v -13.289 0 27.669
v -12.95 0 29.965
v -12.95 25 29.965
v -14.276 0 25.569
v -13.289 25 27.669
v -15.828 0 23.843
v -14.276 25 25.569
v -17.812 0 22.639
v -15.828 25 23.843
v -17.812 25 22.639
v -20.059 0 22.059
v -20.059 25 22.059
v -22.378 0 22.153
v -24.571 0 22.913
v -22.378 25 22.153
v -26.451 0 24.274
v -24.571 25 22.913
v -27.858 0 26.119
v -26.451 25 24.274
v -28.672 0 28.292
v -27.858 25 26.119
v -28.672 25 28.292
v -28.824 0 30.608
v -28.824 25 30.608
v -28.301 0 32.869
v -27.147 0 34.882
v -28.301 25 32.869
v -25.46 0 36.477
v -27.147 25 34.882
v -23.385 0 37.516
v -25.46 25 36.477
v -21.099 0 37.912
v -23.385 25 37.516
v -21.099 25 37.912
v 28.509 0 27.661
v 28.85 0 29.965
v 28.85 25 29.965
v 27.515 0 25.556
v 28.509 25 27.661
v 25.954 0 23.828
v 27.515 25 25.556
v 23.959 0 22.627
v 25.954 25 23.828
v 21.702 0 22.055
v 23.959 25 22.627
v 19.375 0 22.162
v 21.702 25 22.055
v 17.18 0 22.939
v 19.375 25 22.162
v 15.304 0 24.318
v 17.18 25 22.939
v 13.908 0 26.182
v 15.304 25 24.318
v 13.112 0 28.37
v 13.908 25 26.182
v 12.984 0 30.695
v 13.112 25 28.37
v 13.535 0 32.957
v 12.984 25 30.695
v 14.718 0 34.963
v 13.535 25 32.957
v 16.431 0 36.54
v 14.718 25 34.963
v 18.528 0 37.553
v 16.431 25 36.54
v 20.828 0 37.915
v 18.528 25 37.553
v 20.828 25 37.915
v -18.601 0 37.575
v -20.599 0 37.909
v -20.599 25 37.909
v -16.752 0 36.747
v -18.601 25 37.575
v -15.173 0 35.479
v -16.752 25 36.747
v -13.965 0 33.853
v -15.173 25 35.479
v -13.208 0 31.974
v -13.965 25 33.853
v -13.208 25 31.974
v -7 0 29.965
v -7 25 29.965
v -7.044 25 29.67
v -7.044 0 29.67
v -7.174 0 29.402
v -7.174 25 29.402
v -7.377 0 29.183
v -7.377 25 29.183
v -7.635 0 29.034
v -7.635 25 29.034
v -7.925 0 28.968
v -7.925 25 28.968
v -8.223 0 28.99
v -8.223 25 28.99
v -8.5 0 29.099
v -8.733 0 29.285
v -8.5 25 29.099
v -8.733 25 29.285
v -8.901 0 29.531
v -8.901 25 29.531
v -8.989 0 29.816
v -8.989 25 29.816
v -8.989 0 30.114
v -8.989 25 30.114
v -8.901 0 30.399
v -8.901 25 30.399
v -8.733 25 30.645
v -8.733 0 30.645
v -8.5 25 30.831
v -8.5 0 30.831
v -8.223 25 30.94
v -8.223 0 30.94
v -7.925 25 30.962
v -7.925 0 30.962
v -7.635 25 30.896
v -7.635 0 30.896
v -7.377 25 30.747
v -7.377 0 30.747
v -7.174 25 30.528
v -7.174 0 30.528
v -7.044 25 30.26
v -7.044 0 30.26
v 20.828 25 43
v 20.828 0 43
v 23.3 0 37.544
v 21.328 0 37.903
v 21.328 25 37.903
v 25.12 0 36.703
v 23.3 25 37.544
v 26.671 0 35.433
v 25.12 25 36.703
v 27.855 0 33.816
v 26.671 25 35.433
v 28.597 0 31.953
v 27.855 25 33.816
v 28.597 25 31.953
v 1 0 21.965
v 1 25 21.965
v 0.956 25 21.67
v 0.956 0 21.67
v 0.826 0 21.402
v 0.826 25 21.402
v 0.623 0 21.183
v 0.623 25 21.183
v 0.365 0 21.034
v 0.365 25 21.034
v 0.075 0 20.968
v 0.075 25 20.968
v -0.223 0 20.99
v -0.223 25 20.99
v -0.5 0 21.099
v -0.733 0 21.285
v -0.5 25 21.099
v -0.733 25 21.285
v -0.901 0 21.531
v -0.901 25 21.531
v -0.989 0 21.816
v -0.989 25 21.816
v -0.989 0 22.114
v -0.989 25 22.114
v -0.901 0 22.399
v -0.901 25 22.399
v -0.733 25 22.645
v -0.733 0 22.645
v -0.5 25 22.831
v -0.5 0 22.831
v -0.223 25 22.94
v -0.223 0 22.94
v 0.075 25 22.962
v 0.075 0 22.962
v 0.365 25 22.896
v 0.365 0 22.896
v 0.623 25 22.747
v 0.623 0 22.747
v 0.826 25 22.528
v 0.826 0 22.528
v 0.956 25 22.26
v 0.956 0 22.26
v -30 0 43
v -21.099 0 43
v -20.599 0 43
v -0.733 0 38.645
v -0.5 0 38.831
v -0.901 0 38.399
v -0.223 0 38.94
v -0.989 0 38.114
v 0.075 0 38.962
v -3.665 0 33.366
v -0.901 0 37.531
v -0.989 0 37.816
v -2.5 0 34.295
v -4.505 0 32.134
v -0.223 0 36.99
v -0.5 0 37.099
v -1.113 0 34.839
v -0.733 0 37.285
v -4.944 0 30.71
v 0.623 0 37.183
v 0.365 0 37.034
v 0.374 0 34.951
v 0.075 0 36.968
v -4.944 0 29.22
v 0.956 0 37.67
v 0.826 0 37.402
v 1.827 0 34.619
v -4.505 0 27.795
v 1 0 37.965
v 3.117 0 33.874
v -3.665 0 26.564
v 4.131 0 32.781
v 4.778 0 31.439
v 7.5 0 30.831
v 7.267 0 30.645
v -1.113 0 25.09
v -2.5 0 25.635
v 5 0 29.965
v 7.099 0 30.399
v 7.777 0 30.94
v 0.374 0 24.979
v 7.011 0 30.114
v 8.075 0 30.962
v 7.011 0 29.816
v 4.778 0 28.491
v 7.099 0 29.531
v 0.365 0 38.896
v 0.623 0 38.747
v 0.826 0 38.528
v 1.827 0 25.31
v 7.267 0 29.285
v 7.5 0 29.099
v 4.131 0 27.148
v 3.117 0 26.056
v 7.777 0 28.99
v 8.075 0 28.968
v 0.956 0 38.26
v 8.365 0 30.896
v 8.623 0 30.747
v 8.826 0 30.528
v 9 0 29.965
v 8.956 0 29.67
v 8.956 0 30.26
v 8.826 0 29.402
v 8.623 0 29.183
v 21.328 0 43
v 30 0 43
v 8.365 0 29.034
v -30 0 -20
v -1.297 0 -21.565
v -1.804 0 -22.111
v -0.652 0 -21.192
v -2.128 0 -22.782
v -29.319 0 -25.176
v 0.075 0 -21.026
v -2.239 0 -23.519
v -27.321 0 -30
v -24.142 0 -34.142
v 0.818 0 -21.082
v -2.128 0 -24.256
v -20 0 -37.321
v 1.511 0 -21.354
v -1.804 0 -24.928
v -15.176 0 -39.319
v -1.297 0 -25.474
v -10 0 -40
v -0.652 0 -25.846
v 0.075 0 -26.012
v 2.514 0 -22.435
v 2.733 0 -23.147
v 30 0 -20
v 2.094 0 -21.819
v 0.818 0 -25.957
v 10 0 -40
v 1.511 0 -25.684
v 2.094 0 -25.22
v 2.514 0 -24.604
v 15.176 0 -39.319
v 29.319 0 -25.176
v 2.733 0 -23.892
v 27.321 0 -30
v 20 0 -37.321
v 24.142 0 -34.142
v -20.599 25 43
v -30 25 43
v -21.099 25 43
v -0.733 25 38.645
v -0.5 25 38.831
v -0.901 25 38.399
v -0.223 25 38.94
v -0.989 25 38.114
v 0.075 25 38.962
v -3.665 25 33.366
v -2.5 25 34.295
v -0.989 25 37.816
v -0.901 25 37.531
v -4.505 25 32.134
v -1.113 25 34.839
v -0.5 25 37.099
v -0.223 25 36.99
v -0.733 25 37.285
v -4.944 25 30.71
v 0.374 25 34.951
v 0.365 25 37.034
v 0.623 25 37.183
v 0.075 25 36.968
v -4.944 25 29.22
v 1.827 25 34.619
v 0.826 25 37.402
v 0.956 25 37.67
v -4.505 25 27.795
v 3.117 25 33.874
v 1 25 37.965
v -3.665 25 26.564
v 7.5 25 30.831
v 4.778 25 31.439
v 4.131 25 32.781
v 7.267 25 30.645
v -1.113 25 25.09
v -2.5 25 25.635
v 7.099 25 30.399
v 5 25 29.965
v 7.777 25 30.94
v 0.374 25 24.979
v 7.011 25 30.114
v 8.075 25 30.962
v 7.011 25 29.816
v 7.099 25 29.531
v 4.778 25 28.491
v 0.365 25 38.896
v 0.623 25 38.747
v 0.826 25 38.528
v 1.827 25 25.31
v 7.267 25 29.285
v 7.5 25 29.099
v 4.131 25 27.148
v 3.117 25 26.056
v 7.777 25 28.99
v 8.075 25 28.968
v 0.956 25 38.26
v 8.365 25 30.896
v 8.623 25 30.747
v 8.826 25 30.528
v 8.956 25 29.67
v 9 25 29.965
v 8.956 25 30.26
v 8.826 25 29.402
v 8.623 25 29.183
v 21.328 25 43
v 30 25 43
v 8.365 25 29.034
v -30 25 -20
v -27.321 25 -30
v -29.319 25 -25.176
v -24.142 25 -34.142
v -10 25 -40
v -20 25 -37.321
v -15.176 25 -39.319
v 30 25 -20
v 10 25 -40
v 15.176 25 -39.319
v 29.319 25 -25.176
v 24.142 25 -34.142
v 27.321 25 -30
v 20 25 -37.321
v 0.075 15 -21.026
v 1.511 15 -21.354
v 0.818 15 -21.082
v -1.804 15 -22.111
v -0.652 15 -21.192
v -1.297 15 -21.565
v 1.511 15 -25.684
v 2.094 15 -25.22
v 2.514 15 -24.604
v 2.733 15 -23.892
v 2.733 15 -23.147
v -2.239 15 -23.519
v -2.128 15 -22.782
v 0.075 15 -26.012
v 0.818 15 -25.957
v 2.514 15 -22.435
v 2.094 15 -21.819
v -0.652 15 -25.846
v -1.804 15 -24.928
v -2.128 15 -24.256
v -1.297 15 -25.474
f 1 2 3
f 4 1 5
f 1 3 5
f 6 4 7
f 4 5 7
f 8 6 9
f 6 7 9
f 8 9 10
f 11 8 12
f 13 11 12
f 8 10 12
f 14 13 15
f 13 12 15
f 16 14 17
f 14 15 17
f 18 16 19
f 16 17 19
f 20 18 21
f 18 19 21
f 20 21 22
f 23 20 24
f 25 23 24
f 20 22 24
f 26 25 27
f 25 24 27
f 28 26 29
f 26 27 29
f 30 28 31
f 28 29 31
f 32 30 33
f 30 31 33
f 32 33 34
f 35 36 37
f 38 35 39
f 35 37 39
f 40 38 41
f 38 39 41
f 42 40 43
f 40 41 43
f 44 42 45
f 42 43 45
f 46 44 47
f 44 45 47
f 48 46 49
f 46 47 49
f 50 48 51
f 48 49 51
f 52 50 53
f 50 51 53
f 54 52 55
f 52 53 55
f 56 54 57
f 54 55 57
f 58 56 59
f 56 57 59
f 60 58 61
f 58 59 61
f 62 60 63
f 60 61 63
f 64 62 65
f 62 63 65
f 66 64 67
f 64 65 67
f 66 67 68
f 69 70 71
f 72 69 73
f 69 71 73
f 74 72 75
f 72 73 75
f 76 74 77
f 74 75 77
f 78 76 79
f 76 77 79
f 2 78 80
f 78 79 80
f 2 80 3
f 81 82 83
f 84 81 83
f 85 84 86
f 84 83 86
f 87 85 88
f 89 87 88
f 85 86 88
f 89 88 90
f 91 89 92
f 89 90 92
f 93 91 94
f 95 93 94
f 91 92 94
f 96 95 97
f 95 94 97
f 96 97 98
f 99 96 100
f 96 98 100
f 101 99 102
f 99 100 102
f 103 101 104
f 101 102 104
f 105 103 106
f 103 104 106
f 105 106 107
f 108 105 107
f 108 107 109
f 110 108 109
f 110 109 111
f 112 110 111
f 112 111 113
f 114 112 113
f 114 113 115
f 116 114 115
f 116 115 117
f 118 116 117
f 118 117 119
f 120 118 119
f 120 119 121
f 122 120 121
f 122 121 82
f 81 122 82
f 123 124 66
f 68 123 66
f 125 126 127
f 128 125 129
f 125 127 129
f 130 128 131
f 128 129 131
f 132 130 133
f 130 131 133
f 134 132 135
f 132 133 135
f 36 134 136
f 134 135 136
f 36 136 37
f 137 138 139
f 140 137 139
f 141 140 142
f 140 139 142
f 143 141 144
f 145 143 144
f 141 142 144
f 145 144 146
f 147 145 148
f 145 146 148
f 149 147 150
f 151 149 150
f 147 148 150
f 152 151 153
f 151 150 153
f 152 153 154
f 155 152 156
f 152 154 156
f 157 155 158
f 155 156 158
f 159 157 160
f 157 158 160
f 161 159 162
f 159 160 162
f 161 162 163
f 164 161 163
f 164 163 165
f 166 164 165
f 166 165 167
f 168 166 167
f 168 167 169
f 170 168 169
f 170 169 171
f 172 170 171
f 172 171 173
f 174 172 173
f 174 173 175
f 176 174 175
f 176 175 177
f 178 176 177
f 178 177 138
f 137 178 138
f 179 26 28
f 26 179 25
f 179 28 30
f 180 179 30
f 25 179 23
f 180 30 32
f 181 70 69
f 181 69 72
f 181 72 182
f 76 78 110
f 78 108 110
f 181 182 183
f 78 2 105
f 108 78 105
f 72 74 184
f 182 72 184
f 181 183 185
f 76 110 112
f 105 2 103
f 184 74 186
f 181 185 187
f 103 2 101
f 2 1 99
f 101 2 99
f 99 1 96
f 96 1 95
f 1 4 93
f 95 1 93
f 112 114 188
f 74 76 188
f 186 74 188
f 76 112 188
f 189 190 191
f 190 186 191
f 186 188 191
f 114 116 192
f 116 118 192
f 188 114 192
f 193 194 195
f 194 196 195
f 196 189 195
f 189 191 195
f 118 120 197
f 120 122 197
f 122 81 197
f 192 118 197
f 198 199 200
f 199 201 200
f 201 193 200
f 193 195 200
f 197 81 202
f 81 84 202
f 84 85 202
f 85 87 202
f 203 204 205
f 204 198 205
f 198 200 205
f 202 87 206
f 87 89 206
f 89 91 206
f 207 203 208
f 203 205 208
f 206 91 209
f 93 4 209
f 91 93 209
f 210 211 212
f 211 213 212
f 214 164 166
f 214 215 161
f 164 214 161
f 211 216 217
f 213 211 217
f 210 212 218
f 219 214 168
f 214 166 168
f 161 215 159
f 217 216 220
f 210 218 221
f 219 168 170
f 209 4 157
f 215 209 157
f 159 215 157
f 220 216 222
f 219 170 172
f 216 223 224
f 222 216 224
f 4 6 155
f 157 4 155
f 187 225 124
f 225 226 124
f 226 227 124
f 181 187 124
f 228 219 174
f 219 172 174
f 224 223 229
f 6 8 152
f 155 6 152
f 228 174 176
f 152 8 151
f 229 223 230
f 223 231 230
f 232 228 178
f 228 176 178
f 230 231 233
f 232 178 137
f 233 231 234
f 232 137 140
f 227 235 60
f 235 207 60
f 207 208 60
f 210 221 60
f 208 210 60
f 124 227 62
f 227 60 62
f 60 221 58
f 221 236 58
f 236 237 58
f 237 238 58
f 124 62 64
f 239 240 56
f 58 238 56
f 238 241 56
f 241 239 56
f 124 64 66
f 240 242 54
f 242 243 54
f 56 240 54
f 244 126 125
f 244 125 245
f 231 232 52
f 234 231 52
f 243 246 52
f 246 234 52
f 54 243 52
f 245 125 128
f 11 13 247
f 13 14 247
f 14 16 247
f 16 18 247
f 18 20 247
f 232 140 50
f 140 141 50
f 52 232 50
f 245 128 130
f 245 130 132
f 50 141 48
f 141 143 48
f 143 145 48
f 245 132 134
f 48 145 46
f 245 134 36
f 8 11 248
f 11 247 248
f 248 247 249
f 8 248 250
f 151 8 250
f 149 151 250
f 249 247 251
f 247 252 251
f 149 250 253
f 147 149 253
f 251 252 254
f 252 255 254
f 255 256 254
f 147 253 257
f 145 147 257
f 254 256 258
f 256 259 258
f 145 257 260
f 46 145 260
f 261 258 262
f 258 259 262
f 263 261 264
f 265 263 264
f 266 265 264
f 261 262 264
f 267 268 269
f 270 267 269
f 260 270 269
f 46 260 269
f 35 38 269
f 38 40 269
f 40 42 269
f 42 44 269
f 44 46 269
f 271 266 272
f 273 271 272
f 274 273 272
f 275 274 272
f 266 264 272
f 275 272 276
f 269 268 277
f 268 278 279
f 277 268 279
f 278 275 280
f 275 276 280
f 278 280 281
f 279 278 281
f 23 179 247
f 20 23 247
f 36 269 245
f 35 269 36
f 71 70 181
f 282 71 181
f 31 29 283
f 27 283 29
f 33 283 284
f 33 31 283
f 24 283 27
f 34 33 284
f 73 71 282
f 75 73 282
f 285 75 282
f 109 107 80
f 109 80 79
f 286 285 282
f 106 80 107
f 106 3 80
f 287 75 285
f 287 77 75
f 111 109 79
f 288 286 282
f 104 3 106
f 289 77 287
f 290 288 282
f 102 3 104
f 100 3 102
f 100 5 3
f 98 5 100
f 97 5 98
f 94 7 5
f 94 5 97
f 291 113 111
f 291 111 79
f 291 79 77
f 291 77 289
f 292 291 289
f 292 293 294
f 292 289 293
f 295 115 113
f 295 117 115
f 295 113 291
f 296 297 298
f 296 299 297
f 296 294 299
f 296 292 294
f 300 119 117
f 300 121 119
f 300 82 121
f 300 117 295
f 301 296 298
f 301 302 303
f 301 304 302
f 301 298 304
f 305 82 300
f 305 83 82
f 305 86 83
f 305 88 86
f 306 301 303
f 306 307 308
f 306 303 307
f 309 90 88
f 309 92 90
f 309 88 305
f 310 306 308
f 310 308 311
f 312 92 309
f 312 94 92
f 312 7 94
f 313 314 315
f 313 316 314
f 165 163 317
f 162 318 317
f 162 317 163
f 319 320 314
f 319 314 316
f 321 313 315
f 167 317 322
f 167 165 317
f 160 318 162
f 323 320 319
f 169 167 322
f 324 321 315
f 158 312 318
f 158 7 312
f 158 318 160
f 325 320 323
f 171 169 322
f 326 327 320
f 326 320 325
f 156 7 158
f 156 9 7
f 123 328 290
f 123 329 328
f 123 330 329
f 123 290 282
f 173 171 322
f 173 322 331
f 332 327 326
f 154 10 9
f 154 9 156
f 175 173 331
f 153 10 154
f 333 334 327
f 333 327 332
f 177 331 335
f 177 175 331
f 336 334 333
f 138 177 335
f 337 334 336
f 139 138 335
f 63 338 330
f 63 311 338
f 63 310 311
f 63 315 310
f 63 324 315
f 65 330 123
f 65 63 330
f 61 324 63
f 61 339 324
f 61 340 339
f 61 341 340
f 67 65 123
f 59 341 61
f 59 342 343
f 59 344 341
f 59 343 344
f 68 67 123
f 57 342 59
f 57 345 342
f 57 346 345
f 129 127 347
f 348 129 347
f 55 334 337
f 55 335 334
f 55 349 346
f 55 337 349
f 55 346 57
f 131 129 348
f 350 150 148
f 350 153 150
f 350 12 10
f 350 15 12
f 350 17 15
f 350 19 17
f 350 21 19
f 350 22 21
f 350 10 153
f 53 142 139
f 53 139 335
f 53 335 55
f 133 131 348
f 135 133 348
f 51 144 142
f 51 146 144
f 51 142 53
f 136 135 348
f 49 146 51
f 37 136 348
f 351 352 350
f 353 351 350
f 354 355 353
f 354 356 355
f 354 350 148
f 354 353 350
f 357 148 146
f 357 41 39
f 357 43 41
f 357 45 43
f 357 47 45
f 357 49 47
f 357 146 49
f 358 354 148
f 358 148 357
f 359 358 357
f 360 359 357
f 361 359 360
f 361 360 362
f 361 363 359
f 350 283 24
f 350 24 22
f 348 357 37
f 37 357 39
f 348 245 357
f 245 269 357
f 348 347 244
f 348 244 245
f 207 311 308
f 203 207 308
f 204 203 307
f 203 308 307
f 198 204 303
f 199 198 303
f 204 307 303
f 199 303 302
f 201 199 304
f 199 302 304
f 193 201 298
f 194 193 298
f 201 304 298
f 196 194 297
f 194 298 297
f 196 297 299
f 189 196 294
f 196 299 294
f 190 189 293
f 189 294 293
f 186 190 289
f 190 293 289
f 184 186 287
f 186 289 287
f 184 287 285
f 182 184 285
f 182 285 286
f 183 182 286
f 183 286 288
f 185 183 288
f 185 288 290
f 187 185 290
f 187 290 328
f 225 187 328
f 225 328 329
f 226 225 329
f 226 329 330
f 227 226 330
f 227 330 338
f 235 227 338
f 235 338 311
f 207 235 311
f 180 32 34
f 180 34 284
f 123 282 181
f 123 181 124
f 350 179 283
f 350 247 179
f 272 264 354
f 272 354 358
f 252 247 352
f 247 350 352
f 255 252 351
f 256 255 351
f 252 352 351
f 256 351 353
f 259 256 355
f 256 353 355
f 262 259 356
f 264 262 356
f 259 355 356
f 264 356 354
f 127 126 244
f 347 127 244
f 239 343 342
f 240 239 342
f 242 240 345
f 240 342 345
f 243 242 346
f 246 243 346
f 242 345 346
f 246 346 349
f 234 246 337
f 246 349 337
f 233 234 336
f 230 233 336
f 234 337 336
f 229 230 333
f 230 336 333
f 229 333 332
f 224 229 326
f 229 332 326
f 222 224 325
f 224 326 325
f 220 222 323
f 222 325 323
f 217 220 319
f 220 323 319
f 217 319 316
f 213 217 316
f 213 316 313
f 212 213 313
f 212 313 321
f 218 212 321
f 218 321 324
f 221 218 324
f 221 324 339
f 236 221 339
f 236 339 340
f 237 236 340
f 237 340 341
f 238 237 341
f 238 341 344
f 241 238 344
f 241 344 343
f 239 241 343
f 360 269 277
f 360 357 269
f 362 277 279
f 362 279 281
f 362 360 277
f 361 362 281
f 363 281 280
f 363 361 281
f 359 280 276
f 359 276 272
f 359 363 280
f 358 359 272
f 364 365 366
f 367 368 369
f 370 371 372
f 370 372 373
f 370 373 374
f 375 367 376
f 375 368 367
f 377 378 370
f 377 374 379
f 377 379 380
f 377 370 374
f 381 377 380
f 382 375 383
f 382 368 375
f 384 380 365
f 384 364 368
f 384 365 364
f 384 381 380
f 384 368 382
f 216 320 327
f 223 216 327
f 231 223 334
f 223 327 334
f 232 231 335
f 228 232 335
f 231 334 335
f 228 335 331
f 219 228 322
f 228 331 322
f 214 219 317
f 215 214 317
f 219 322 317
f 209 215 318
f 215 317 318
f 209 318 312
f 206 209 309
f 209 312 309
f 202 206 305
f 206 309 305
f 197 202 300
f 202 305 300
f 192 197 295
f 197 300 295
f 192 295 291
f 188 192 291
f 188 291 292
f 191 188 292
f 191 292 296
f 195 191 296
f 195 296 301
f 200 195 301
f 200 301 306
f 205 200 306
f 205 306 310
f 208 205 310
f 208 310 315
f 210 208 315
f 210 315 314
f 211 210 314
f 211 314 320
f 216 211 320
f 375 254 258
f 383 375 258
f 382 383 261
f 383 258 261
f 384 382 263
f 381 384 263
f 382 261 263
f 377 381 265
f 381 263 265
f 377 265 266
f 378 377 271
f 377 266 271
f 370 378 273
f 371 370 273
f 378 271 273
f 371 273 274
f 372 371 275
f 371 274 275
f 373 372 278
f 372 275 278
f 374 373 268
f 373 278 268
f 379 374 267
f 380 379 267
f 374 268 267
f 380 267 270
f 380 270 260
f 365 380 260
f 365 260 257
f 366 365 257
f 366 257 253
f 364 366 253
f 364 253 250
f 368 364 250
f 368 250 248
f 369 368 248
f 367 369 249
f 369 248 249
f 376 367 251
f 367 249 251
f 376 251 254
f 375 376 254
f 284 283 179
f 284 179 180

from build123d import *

# Parameters (mm, degrees)
SKETCH1_W           = 60
SKETCH1_H           = 80
BOSS_EXTRUDE1_DEPTH = 25
FILLET1_R           = 20
SKETCH3_R           = 7.95
CUT_EXTRUDE2_DEPTH  = 35
SKETCH5_W           = 60
SKETCH5_H           = 25
BOSS_EXTRUDE2_DEPTH = 3
SKETCH6_R           = 5
SKETCH6_R_2         = 1
CUT_EXTRUDE3_DEPTH  = 26
SKETCH7_R           = 2.5
CUT_EXTRUDE4_DEPTH  = 15
SKETCH8_W           = 0.5
SKETCH8_H           = 1.458969306
SKETCH8_H_2         = 7.530561822
CUT_EXTRUDE5_DEPTH  = 26


with BuildPart() as part:
    # Sketch1 → Boss-Extrude1 (new body)
    with BuildSketch(Plane(origin=(0, 0, 0), x_dir=(1, 0, 0), z_dir=(0, 1, 0))):
        Rectangle(SKETCH1_W, SKETCH1_H)
    extrude(amount=BOSS_EXTRUDE1_DEPTH)

    # Fillet1
    fillet1_edges = [part.edges().sort_by_distance(p)[0] for p in [
        (-30, 12.5, -40),
        (30, 12.5, -40),
    ]]
    fillet(fillet1_edges, radius=FILLET1_R)

    # Sketch3 → Cut-Extrude2 (cut)
    with BuildSketch(Plane(origin=(0, 25, 0), x_dir=(1, 0, 0), z_dir=(0, 1, 0))):
        with Locations((-20.9, -29.964854959)):
            Circle(SKETCH3_R)
        with Locations((20.9, -29.964854959)):
            Circle(SKETCH3_R)
    extrude(amount=-CUT_EXTRUDE2_DEPTH, mode=Mode.SUBTRACT)

    # Sketch5 → Boss-Extrude2 (add)
    with BuildSketch(Plane.XY.offset(40)):
        with Locations((0, 12.5)):
            Rectangle(SKETCH5_W, SKETCH5_H)
    extrude(amount=BOSS_EXTRUDE2_DEPTH)

    # Sketch6 → Cut-Extrude3 (cut, through all)
    with BuildSketch(Plane(origin=(0, 25, 0), x_dir=(1, 0, 0), z_dir=(0, 1, 0))):
        with Locations((0, -29.964854959)):
            Circle(SKETCH6_R)
        with Locations((0, -37.964854959)):
            Circle(SKETCH6_R_2)
        with Locations((8, -29.964854959)):
            Circle(SKETCH6_R_2)
        with Locations((0, -21.964854959)):
            Circle(SKETCH6_R_2)
        with Locations((-8, -29.964854959)):
            Circle(SKETCH6_R_2)
    extrude(amount=-CUT_EXTRUDE3_DEPTH, mode=Mode.SUBTRACT)

    # Sketch7 → Cut-Extrude4 (cut)
    with BuildSketch(Plane(origin=(0, 0, 0), x_dir=(-1, 0, 0), z_dir=(0, -1, 0))):
        with Locations((-0.26141162, 23.519285142)):
            Circle(SKETCH7_R)
    extrude(amount=-CUT_EXTRUDE4_DEPTH, mode=Mode.SUBTRACT)

    # Sketch8 → Cut-Extrude5 (cut, through all)
    with BuildSketch(Plane.XZ):
        with BuildLine():
            ThreePointArc((20.828077187, 37.914529614), (21.078165346, 37.9128583), (21.328077187, 37.903321431))
            Line((21.328077187, 37.903321431), (21.328077187, 43))
            Line((21.328077187, 43), (20.828077187, 43))
            Line((20.828077187, 43), (20.828077187, 37.914529614))
        make_face()
        with Locations((21.078077187, 43.729484653)):
            Rectangle(SKETCH8_W, SKETCH8_H)
        with BuildLine():
            Line((21.328077187, 37.903321431), (21.328077187, 36.928407484))
            Line((21.328077187, 36.928407484), (20.828077187, 36.928407484))
            Line((20.828077187, 36.928407484), (20.828077187, 37.914529614))
            ThreePointArc((20.828077187, 37.914529614), (15.303987418, 24.317984748), (28.85, 29.964854959))
            ThreePointArc((28.85, 29.964854959), (26.670862745, 35.432911578), (21.328077187, 37.903321431))
        make_face()
        with BuildLine():
            Line((20.828077187, 36.928407484), (21.328077187, 36.928407484))
            Line((21.328077187, 36.928407484), (21.328077187, 37.903321431))
            ThreePointArc((21.328077187, 37.903321431), (21.078165346, 37.9128583), (20.828077187, 37.914529614))
            Line((20.828077187, 37.914529614), (20.828077187, 36.928407484))
        make_face()
        with Locations((-20.848704866, 40.693688395)):
            Rectangle(SKETCH8_W, SKETCH8_H_2)
    extrude(amount=-CUT_EXTRUDE5_DEPTH, mode=Mode.SUBTRACT)


solid = part.part
